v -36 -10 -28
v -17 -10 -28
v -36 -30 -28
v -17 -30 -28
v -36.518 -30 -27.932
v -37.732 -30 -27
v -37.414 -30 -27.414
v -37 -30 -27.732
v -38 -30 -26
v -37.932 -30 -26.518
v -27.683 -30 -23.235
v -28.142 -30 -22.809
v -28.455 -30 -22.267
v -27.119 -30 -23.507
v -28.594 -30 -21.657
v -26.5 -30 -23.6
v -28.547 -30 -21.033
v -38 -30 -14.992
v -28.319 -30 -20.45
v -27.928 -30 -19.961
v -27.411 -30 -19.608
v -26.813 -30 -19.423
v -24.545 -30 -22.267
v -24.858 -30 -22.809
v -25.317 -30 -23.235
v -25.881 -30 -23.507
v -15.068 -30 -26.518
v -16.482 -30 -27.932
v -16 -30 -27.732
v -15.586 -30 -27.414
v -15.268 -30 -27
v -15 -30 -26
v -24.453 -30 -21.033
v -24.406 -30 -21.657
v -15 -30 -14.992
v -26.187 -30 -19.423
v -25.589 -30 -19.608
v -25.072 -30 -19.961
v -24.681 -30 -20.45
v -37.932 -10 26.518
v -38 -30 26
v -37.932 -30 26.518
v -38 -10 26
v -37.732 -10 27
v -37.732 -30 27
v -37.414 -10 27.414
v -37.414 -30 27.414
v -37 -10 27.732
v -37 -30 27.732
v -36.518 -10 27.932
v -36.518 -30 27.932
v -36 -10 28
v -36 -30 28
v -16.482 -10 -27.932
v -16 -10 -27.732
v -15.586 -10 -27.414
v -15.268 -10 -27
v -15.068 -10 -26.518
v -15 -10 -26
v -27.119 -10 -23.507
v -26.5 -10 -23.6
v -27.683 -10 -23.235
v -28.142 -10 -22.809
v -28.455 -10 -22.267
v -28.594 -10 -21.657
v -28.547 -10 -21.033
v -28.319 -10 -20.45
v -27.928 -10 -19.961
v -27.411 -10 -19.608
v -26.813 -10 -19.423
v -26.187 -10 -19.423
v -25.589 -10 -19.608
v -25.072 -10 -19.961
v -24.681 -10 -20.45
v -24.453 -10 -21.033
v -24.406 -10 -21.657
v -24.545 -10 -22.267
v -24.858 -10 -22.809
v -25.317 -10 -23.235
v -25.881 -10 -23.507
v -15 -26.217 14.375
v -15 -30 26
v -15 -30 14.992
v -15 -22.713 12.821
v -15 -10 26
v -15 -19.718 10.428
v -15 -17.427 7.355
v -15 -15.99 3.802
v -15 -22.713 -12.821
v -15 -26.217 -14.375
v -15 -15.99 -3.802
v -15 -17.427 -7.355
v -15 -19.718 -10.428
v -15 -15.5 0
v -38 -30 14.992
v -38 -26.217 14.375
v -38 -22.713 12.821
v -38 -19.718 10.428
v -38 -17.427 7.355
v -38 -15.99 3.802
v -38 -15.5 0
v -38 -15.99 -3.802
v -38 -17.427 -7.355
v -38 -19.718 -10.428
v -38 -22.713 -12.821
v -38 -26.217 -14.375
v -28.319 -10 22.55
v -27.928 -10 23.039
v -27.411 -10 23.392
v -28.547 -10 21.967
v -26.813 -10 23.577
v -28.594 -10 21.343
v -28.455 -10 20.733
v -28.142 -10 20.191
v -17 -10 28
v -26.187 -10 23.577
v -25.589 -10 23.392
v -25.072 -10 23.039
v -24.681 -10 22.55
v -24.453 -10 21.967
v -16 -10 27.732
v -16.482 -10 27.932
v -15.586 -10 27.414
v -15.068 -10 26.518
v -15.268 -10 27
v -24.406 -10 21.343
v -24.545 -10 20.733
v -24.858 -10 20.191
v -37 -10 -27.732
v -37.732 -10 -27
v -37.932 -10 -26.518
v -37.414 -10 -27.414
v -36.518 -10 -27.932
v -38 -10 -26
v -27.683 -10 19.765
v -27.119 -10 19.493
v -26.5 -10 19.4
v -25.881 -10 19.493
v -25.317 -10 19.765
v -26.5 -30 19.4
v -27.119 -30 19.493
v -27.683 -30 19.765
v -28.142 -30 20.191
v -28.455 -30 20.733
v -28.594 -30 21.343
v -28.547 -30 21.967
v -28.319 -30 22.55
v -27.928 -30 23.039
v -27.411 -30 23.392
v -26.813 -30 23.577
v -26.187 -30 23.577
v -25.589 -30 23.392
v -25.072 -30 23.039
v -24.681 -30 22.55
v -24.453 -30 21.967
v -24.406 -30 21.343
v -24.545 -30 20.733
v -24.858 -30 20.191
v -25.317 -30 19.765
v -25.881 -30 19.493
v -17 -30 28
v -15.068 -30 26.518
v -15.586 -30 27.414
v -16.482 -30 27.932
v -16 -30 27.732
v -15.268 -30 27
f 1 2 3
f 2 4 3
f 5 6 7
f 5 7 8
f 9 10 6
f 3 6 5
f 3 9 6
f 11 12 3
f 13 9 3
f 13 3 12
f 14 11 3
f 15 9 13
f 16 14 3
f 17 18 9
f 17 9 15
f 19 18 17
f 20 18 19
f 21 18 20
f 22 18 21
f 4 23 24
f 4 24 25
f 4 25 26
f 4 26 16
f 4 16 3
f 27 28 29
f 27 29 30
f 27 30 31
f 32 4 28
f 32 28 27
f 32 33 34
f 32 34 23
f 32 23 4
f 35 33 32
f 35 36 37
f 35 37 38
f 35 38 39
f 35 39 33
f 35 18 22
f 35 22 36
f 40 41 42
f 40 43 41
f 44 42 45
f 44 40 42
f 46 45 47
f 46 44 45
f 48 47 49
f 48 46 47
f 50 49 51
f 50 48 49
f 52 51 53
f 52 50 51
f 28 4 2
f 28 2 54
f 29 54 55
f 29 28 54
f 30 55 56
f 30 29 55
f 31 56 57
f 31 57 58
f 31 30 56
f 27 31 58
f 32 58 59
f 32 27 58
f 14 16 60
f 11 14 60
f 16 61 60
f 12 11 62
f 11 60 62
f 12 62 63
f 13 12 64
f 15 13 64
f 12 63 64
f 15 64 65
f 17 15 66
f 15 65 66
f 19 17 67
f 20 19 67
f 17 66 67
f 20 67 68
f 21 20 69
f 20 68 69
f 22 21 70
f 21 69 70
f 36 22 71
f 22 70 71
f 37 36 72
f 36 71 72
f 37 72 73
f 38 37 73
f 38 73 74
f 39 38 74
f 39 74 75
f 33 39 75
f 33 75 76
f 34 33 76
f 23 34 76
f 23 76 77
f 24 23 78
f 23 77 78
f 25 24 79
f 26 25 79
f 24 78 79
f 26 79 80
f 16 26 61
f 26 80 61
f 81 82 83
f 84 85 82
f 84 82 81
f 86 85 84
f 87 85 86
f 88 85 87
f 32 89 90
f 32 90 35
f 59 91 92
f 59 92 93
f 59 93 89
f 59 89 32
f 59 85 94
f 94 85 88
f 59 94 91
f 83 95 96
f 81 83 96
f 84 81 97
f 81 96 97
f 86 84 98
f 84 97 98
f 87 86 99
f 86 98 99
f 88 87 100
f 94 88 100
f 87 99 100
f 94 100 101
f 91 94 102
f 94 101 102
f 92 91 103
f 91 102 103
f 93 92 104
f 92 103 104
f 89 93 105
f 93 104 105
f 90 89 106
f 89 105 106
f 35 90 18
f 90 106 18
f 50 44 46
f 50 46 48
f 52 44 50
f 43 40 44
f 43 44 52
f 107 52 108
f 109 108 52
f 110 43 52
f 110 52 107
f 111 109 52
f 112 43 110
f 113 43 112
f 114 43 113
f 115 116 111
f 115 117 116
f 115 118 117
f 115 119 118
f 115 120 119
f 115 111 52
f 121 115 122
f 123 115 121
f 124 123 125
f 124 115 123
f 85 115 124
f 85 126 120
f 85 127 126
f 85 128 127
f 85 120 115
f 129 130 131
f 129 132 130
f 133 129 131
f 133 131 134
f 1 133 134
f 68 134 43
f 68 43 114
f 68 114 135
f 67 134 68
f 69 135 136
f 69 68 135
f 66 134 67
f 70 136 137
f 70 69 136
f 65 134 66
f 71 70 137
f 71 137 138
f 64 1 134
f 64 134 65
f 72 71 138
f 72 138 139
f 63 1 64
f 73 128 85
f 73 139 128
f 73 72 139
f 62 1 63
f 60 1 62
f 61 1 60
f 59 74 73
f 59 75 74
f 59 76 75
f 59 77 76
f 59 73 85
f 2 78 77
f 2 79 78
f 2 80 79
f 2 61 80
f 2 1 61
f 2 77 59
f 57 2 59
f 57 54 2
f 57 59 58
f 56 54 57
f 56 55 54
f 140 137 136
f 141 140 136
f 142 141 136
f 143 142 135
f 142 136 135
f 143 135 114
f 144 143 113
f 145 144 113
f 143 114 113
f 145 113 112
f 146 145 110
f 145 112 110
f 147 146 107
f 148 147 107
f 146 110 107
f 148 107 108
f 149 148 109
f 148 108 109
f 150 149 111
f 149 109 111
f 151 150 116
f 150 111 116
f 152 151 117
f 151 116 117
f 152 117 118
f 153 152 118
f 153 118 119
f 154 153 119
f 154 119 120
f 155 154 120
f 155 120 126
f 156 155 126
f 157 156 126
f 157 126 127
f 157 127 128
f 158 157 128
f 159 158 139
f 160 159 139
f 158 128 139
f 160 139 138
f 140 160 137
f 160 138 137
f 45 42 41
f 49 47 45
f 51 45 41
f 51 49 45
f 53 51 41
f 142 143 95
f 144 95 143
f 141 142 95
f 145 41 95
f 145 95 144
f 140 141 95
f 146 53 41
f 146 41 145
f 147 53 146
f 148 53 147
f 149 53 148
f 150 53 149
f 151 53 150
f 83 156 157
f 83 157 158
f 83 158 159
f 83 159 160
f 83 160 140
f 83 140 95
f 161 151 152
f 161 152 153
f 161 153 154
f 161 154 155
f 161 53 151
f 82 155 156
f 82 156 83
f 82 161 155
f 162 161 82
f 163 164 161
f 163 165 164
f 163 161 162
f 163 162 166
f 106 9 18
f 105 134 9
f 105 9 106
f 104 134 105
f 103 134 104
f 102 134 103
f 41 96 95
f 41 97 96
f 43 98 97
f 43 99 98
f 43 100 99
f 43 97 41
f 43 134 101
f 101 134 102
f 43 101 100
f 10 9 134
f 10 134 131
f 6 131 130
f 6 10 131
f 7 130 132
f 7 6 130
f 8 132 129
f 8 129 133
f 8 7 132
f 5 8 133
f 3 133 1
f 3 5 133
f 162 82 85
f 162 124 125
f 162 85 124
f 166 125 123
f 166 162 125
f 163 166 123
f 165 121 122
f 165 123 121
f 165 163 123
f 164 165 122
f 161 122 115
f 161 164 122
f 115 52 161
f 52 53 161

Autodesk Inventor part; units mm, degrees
ref_plane "YZ Plane" through (0, 0, 0) normal (1, 0, 0) x (0, 1, 0)
ref_plane "XZ Plane" through (0, 0, 0) normal (0, 1, 0) x (-1, 0, 0)
ref_plane "XY Plane" through (0, 0, 0) normal (0, 0, 1) x (1, 0, 0)
sketch "Sketch1" plane through (0, 0, 0) normal (0, 1, 0) x (-1, 0, 0)
  line L0 (12.5, 25.5) -> (-12.5, 25.5)
  line L1 (-12.5, 25.5) -> (-12.5, -25.5)
  line L2 (-12.5, -25.5) -> (12.5, -25.5)
  line L3 (12.5, -25.5) -> (12.5, 25.5)
  line L4 (13, 26) -> (-13, 26)
  line L5 (-13, 26) -> (-13, -26)
  line L6 (-13, -26) -> (13, -26)
  line L7 (13, -26) -> (13, 26)
  line L8 (15, 28) -> (-15, 28)
  line L9 (-15, 28) -> (-15, -28)
  line L10 (-15, -28) -> (15, -28)
  circle A0 centre (8.5, 21.5) radius 2
  circle A1 centre (8.5, -21.5) radius 2
  circle A2 centre (-8.5, 21.5) radius 2
  circle A3 centre (-8.5, -21.5) radius 2
  line L11 (15, -28) -> (38, -28)
  line L12 (38, -28) -> (38, -26)
  line L13 (38, -26) -> (13, -26)
  line L14 (13, 26) -> (38, 26)
  line L15 (38, 26) -> (38, 28)
  line L16 (38, 28) -> (15, 28)
  line L17 (38, -26) -> (38, 26)
  line L18 (12.5, -15.5) -> (-12.5, -15.5)
  line L19 (12.5, 15.5) -> (-12.5, 15.5)
  line L20 (12.5, -15.5) -> (13, -15.5)
  line L21 (12.5, 15.5) -> (13, 15.5)
  line L22 (-12.5, -15.5) -> (-13, -15.5)
  line L23 (-12.5, 15.5) -> (-13, 15.5)
  point P0 (0, 0)
  dimension "d0" = 51
  dimension "d1" = 25
  dimension "d2" = 12.5
  dimension "d3" = 25.5
  dimension "d4" = 4
  dimension "d5" = 4
  dimension "d6" = 4
  dimension "d7" = 4
  dimension "d8" = 0.5
  dimension "d10" = 4
  dimension "d11" = 4
  dimension "d12" = 4
  dimension "d13" = 4
  dimension "d50" = 25
  dimension "d51" = 10
  dimension "d52" = 10
extrude "Extrusion1" add sketch "Sketch1" against normal blind 10 contours L3 L19 L1 L0 | L0 L1 L23 L5 L4 L7 L21 L3 | L21 L7 L20 L3 | L3 L18 L1 L19 | L1 L22 L5 L23 | L20 L7 L6 L5 L22 L1 L2 L3 | L3 L2 L1 L18 | L7 L14 L17 L13 | L5 L6 L13 L12 L11 L10 L9 L8 L16 L15 L14 L4 | A0 | A1 | A2 | A3
extrude "Extrusion2" add sketch "Sketch1" along normal blind 7 contours L5 L6 L13 L12 L11 L10 L9 L8 L16 L15 L14 L4
extrude "Extrusion3" cut sketch "Sketch1" against normal blind 6 contours A0 | A1 | A2 | A3
extrude "Extrusion8" cut sketch "Sketch1" against normal blind 7 contours L21 L7 L20 L3 | L3 L18 L1 L19 | L1 L22 L5 L23 | L7 L14 L17 L13
fillet "Fillet3" radius 2 6 edges at (-13, -3.5, -15.5) (-13, -3.5, -26) (13, -3.5, -15.5) (13, -3.5, 15.5) (-13, -3.5, 15.5) (-13, -3.5, 26)
sketch "Sketch7" plane through (8.5, -6, -21.5) normal (0, 1, 0) x (1, 0, 0)
  circle A0 centre (0, 0) radius 2 projected
  circle A1 centre (-17, 0) radius 2 projected
  circle A2 centre (-17, -43) radius 2 projected
  circle A3 centre (0, -43) radius 2 projected
  point P0 (-8.5, -21.5)
extrude "Extrusion9" cut sketch "Sketch7" against normal blind 1
sketch "Sketch8" plane through (-38, -10, -28) normal (-1, 0, 0) x (0, 0, 1)
  line L0 (54, 17) -> (54, 3) projected
  line L1 (54, 3) -> (2, 3) projected
  line L2 (2, 3) -> (2, 17) projected
  line L3 (0, 17) -> (2, 17) projected
  line L4 (0, 17) -> (0, 0) projected
  line L5 (56, 0) -> (0, 0) projected
  line L6 (56, 0) -> (56, 17) projected
  line L7 (54, 17) -> (56, 17) projected
  line L8 (2, 17) -> (54, 17)
  line L9 (13.7, 17) -> (13.7, 9)
  line L10 (13.7, 9) -> (19.7, 9)
  line L11 (19.7, 9) -> (19.7, 17)
  line L12 (36.7, 17) -> (36.7, 9)
  line L13 (36.7, 9) -> (42.7, 9)
  line L14 (42.7, 9) -> (42.7, 17)
  point P0 (28, 10)
  dimension "d58" = 6
  dimension "d59" = 6
  dimension "d60" = 17
  dimension "d63" = 11.7
  dimension "d66" = 8
extrude "Extrusion10" add sketch "Sketch8" against normal blind 2 contours L0 L1 L2 L8 L9 L10 L11 L12 L13 L14
fillet "Fillet4" radius 2 8 edges at (-37, -1, -14.3) (-37, -1, -8.3) (-37, -1, 8.7) (-37, -1, 14.7) (-38, -1.5, 28) (15, -1.5, 28) (15, -1.5, -28) (-38, -1.5, -28)
fillet "Fillet5" radius 2 2 edges at (-36, 0, -26) (-36, 0, 26)
sketch "Sketch10" plane through (0, -10, 0) normal (0, -1, 0) x (1, 0, 0)
  line L0 (-15, 26) -> (-34, 26) projected
  arc A0 (-34, 26) -> (-36, 24) centre (-34, 24) ccw projected
  line L1 (-36, -24) -> (-36, 24) projected
  arc A1 (-36, -24) -> (-34, -26) centre (-34, -24) ccw projected
  line L2 (-34, -26) -> (-15, -26) projected
  arc A2 (-38, -26) -> (-36, -28) centre (-36, -26) ccw projected
  line L3 (-36, -28) -> (13, -28) projected
  arc A3 (13, -28) -> (15, -26) centre (13, -26) ccw projected
  line L4 (15, -26) -> (15, 26) projected
  arc A4 (15, 26) -> (13, 28) centre (13, 26) ccw projected
  line L5 (13, 28) -> (-36, 28) projected
  arc A5 (-36, 28) -> (-38, 26) centre (-36, 26) ccw projected
  line L6 (-38, 26) -> (-38, -26) projected
  line L7 (-36, 24) -> (-36, 28)
  line L8 (-36, -24) -> (-36, -28)
  line L9 (-15, 28) -> (-15, -28)
  point P0 (0, 0)
extrude "Extrusion11" add sketch "Sketch10" along normal blind 20 contours L9 L2 A1 L1 A0 L0 | L0 A0 L7 L5 L9 | L9 L3 L8 A1 L2 | L1 L8 A2 L6 A5 L7
sketch "Sketch11" plane through (-38, 7, -8.3) normal (-1, 0, 0) x (0, 0, 1)
  line L0 (-17.7, -37) -> (-17.7, 0) projected
  line L1 (34.3, -37) -> (-17.7, -37) projected
  line L2 (34.3, 0) -> (34.3, -37) projected
  line L3 (34.3, 0) -> (23, 0) projected
  line L4 (23, 0) -> (23, -6) projected
  arc A0 (21, -8) -> (23, -6) centre (21, -6) ccw projected
  line L5 (21, -8) -> (19, -8) projected
  arc A1 (17, -6) -> (19, -8) centre (19, -6) ccw projected
  line L6 (17, -6) -> (17, 0) projected
  line L7 (17, 0) -> (0, 0) projected
  line L8 (0, 0) -> (0, -6) projected
  arc A2 (-2, -8) -> (0, -6) centre (-2, -6) ccw projected
  line L9 (-2, -8) -> (-4, -8) projected
  arc A3 (-6, -6) -> (-4, -8) centre (-4, -6) ccw projected
  line L10 (-6, -6) -> (-6, 0) projected
  line L11 (-17.7, 0) -> (-6, 0) projected
  arc A4 (23.2917, -37) -> (-6.6917, -37) centre (8.3, -37.5) ccw
  point P0 (8.3, -7)
  dimension "d71" = 52
  dimension "d72" = 26
  dimension "d73" = 0.5
  dimension "d74" = 30
extrude "Extrusion12" cut sketch "Sketch11" against normal through all contours A4 L1
fillet "Fillet6" radius 2 2 edges at (-15, -20, 28) (-15, -20, -28)
sketch "Sketch12" plane through (0, -30, 0) normal (0, -1, 0) x (1, 0, 0)
  arc A0 (-15, 26) -> (-17, 28) centre (-17, 26) ccw projected
  line L0 (-17, 28) -> (-36, 28) projected
  arc A1 (-36, 28) -> (-38, 26) centre (-36, 26) ccw projected
  line L1 (-38, 26) -> (-38, 14.9917) projected
  line L2 (-38, 14.9917) -> (-15, 14.9917) projected
  line L3 (-15, 14.9917) -> (-15, 26) projected
  arc A2 (-17, -28) -> (-15, -26) centre (-17, -26) ccw projected
  line L4 (-15, -26) -> (-15, -14.9917) projected
  line L5 (-15, -14.9917) -> (-38, -14.9917) projected
  line L6 (-38, -14.9917) -> (-38, -26) projected
  arc A3 (-38, -26) -> (-36, -28) centre (-36, -26) ccw projected
  line L7 (-36, -28) -> (-17, -28) projected
  point P0 (0, 0)
  point P1 (-26.5, 21.5)
  point P2 (-26.5, -21.5)
  dimension "d78" = 23
  dimension "d79" = 11.5
  dimension "d80" = 13.0083
  dimension "d81" = 6.5
  dimension "d82" = 6.5
hole "Hole1" at (-26.5, -30, 21.5) at (-26.5, -30, -21.5) direction (0, 1, 0) diameter 4.2 end through all
sketch "Sketch13" plane through (0, 7, 0) normal (0, 1, 0) x (1, 0, 0)
  line L0 (-47.6538, 31.9961) -> (20.3258, 31.9961)
  line L1 (20.3258, 31.9961) -> (20.3258, -36.2753)
  line L2 (20.3258, -36.2753) -> (-47.6538, -36.2753)
  line L3 (-47.6538, -36.2753) -> (-47.6538, 31.9961)
  point P0 (0, 0)
extrude "Extrusion13" cut sketch "Sketch13" against normal up to surface (17 mm away)
equation "\"d2\" = 0.5 * d1"
equation "\"d3\" = 0.5 * d0"
equation "\"d5\" = d4"
equation "\"d6\" = d5"
equation "\"d7\" = d4"
equation "\"d59\" = d58"
equation "\"d72\" = 0.5 * d71"
equation "\"d79\" = 0.5 * d78"
equation "\"d82\" = d81"
properties part number "3DP_ASA_Preamp_Case_Clamp"
